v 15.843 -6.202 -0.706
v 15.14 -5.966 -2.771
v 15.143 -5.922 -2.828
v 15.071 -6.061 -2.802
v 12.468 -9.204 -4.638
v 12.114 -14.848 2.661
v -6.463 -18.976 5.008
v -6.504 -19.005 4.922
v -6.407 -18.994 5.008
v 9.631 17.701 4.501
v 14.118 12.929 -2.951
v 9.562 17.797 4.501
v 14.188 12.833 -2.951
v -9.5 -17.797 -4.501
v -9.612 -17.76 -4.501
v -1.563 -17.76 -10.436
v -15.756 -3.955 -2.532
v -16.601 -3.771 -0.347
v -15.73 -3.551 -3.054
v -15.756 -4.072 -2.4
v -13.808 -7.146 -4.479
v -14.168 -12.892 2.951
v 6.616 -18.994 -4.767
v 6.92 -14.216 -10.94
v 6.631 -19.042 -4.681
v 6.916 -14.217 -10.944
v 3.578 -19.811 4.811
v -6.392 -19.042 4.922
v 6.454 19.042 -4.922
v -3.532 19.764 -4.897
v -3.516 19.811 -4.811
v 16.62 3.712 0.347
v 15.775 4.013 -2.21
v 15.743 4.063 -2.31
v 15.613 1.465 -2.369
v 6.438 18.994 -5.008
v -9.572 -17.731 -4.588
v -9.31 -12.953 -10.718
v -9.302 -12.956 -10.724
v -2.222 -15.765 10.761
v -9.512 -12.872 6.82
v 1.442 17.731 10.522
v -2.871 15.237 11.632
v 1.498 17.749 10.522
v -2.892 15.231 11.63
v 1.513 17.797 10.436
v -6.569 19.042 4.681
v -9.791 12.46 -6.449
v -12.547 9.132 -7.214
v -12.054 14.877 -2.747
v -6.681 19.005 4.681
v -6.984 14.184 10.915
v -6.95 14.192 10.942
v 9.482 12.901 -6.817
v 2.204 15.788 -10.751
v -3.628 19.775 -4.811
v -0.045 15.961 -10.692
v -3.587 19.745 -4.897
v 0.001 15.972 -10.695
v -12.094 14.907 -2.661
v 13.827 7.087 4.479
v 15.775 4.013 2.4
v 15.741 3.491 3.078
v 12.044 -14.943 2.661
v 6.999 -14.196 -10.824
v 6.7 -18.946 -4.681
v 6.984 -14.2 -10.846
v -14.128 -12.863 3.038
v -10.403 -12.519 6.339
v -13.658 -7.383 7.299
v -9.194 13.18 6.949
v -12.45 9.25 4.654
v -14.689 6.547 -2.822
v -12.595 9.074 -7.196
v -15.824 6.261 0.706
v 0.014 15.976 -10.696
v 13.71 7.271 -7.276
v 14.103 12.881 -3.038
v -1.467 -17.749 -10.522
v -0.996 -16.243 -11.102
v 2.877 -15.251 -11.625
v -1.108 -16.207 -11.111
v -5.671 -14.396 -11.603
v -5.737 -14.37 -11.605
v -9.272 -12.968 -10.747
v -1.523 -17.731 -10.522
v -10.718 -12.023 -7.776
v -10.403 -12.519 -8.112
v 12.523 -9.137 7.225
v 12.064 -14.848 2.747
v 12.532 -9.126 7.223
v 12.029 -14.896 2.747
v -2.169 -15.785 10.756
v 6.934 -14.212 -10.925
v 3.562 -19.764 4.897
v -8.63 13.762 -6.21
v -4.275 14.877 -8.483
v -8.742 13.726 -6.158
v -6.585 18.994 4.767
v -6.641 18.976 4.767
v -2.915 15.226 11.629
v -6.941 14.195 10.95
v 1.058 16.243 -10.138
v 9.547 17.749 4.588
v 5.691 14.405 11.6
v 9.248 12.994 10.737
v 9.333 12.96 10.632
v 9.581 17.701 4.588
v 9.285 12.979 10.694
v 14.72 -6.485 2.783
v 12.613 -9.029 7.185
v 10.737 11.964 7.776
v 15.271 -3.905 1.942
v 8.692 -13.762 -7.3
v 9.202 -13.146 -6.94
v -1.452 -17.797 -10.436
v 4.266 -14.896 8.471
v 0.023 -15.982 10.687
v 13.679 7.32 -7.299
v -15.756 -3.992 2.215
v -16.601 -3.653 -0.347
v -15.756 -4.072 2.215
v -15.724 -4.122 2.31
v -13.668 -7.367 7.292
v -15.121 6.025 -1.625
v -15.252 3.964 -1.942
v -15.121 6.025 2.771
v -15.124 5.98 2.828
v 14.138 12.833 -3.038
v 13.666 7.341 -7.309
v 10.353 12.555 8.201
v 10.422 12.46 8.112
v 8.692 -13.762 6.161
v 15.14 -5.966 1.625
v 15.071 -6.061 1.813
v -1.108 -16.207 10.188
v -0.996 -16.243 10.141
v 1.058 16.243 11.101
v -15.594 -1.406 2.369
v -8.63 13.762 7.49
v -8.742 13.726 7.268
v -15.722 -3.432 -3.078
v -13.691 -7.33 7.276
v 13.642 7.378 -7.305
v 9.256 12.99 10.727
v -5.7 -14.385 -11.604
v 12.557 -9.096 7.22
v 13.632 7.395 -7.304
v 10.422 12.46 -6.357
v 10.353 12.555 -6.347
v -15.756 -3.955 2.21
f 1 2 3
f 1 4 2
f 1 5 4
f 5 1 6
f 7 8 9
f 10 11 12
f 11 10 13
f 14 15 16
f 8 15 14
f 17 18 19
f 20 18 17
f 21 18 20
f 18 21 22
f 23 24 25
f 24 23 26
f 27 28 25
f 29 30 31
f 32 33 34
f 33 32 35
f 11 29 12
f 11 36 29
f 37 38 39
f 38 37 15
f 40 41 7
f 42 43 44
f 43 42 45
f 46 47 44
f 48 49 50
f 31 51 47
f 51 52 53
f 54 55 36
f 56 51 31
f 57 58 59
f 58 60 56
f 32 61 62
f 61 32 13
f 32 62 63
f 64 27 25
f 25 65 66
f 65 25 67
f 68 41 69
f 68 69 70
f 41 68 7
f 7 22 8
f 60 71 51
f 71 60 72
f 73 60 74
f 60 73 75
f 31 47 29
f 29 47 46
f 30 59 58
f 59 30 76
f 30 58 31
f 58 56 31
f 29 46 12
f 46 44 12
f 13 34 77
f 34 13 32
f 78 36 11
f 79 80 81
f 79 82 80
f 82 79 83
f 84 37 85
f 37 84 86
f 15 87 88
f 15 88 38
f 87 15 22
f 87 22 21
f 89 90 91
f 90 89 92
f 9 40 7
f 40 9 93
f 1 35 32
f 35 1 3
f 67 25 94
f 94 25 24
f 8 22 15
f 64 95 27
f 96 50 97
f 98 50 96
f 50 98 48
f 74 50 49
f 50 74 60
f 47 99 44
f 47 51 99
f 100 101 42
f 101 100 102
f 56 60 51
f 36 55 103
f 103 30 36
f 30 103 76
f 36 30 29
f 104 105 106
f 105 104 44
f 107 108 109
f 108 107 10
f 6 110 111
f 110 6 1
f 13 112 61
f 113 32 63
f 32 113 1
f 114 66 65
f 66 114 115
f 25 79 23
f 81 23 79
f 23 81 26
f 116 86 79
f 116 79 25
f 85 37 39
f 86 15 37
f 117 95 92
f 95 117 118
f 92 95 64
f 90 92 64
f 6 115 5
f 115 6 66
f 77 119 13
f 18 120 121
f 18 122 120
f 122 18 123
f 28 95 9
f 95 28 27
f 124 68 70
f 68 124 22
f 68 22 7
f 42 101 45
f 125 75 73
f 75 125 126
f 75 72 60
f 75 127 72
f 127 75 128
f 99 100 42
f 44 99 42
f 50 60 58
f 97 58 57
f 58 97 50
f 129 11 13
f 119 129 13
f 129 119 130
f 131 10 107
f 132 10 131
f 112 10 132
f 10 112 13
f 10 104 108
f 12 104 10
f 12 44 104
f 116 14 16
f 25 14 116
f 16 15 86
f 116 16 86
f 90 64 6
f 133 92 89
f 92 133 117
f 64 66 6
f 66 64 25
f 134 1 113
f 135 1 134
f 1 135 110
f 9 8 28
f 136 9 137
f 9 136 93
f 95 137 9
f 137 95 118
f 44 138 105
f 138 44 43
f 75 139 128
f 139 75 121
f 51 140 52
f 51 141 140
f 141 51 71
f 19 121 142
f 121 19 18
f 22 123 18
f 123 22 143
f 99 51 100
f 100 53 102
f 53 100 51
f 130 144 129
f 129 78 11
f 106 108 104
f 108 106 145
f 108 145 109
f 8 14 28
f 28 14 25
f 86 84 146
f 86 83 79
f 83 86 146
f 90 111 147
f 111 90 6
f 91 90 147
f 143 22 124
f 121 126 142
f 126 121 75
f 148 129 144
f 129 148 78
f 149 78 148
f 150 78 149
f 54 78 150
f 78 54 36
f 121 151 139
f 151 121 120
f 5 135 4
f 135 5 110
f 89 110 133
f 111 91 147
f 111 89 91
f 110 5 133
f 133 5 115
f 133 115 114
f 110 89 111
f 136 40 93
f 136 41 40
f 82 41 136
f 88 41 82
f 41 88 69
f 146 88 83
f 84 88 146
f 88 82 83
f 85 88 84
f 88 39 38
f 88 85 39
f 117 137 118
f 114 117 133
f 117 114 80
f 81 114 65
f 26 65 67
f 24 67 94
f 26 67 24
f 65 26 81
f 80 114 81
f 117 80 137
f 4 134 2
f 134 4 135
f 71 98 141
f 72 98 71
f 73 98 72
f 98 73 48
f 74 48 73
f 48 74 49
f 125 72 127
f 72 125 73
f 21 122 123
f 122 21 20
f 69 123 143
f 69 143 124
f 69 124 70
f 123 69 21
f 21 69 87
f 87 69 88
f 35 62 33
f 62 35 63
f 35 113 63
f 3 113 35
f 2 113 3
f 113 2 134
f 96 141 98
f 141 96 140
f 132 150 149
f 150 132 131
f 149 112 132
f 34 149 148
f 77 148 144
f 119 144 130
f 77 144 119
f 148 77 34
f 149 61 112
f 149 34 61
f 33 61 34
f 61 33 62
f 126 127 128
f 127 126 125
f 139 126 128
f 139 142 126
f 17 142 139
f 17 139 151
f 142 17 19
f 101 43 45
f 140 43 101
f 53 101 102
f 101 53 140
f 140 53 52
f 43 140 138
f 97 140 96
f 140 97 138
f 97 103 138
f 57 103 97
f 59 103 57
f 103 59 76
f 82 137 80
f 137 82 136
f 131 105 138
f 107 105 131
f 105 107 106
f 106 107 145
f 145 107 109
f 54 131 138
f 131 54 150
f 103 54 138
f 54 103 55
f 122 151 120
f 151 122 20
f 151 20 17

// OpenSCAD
// Auto-generated OpenSCAD file

    inner_points = 10*[[-0.10267110435699114, -1.6147732450963963, 0.5000000000008641], [-0.1026711043570435, -1.6147732450969283, -0.4999999999991359], [0.1026711043570435, 1.6147732450969283, 0.4999999999991359], [0.10267110435699114, 1.6147732450963963, -0.5000000000008641], [0.8660772310082325, -1.3667275583225522, 0.5000000000006815], [0.8660772310081802, -1.3667275583230845, -0.4999999999993185], [-1.0322025675203217, -1.2460304363672796, 0.5000000000007166], [-1.032202567520374, -1.2460304363678119, -0.49999999999928335], [1.032202567520374, 1.2460304363678119, 0.49999999999928335], [1.0322025675203217, 1.2460304363672796, -0.5000000000007166], [-0.8660772310081802, 1.3667275583230845, 0.4999999999993185], [-0.8660772310082325, 1.3667275583225522, -0.5000000000006815], [1.504013501010716, -0.596638397630546, 0.5000000000002386], [1.5040135010106637, -0.5966383976310778, -0.4999999999997614], [-1.5674677331657878, -0.40134635196262397, 0.5000000000002954], [-1.5674677331658402, -0.4013463519631557, -0.4999999999997045], [1.5674677331658402, 0.4013463519631557, 0.4999999999997045], [1.5674677331657878, 0.40134635196262397, -0.5000000000002954], [-1.5040135010106637, 0.5966383976310778, 0.4999999999997614], [-1.504013501010716, 0.596638397630546, -0.5000000000002386], [0.2110002639625055, -0.8240665545671229, 1.8763819204716008], [-0.3136713683195228, -0.7907066905295395, -1.8763819204707366], [0.3136713683195228, 0.7907066905295395, 1.8763819204707366], [-0.2110002639625055, 0.8240665545671229, -1.8763819204716008], [-0.718531199200825, -0.4553237458380063, 1.8763819204714534], [0.6550769670457008, -0.5426610037556955, -1.8763819204709191], [-0.6550769670457008, 0.5426610037556955, 1.8763819204709191], [0.718531199200825, 0.4553237458380063, -1.8763819204714534], [0.8489365339649888, -0.05397739387511649, 1.8763819204711578], [-0.8489365339649888, 0.05397739387511649, -1.8763819204711578], [-0.5075309352384453, -1.2793903004064069, 1.3506508083527466], [0.3414055987263038, -1.3333676942839572, -1.3506508083513487], [-0.3414055987263038, 1.3333676942839572, 1.3506508083513487], [0.5075309352384453, 1.2793903004064069, -1.3506508083527466], [1.0599367979273688, -0.8780439484435167, 1.3506508083524513], [-1.162607902284386, -0.7367292966531456, -1.3506508083515871], [1.162607902284386, 0.7367292966531456, 1.3506508083515871], [-1.0599367979273688, 0.8780439484435167, -1.3506508083524513], [-1.3736081662466517, 0.0873372579164117, 1.3506508083520654], [1.3736081662466517, -0.0873372579164117, -1.3506508083520654]];

    outer_points = 10*[[1.3411441290868589, 0.49569687647638716, -0.9075522136038779], [1.263452202904808, -0.49569687647638716, -1.0129200987128433], [-1.263452202904808, 0.49569687647638716, 1.0129200987128433], [-1.3411441290868589, -0.49569687647638716, 0.9075522136038779], [0.5328721345308199, 0.6202033120279035, -1.4830472442710922], [0.45518020834876893, -0.3711904409248708, -1.5884151293800577], [1.6519824877191422, 0.3711904409248708, 0.034720391489278635], [1.574290561537091, -0.6202033120279035, -0.0706474936196867], [-1.574290561537091, 0.6202033120279035, 0.0706474936196867], [-1.6519824877191422, -0.3711904409248708, -0.034720391489278635], [-0.45518020834876893, 0.3711904409248708, 1.5884151293800577], [-0.5328721345308199, -0.6202033120279035, 1.4830472442710922], [-0.4641010661832383, 0.6971525210168389, -1.4719451591541524], [-0.5417929923652892, -0.29424123193593543, -1.5773130442631174], [1.3466575224373667, 0.29424123193593543, 0.983854462530699], [1.268965596255316, -0.6971525210168389, 0.8784865774217337], [-1.268965596255316, 0.6971525210168389, -0.8784865774217337], [-1.3466575224373667, -0.29424123193593543, -0.983854462530699], [0.5417929923652892, 0.29424123193593543, 1.5773130442631174], [0.4641010661832383, -0.6971525210168389, 1.4719451591541524], [0.642271561558062, 1.8946460465314703, -0.49215801202206017], [0.6600266044377715, -1.8946460465314703, -0.4680781441363005], [-0.6600266044377715, 1.8946460465314703, 0.4680781441363005], [-0.642271561558062, -1.8946460465314703, 0.49215801202206017], [0.9531099201903453, 1.770139610979954, 0.4501145930710967], [-0.14824539011826776, -1.770139610979954, -1.043573174803515], [0.14824539011826776, 1.770139610979954, 1.043573174803515], [-0.9531099201903453, -1.770139610979954, -0.4501145930710967], [-0.3547016391559959, 1.9715952555204057, -0.4810559269051196], [0.3547016391559959, -1.9715952555204057, 0.4810559269051196], [1.4087566933394584, 1.2833458031149498, -0.29514898898768743], [0.6984060027284527, -1.2833458031149498, -1.2585457489030916], [-0.6984060027284527, 1.2833458031149498, 1.2585457489030916], [-1.4087566933394584, -1.2833458031149498, 0.29514898898768743], [0.10094513399311722, 1.4848014476554017, -1.2263195089639038], [1.2013530320027161, -1.4848014476554017, 0.2660833528055431], [-1.2013530320027161, 1.4848014476554017, -0.2660833528055431], [-0.10094513399311722, -1.4848014476554017, 1.2263195089639038], [0.9147305218996641, 1.1588393675634334, 1.2405821978378877], [-0.9147305218996641, -1.1588393675634334, -1.2405821978378877]];

    // Convex hull for inner set (I)
    module inner_hull() {
        hull() {
            for (p = inner_points) {
                translate(p) sphere(r=0.1);
            }
        }
    }

    // Convex hull for outer set (O) minus inner hull (O \ I)
    module outer_minus_inner() {
        difference() {
            hull() {
                for (p = outer_points) {
                    translate(p) sphere(r=0.1);
                }
            }
            inner_hull(); // Subtract inner hull
        }
    }

    // Convex hull for outer set (O) minus all translated inner hulls
    module outer_minus_AllTranslationInner() {
        difference() {
            hull() {
                for (p = outer_points) {
                    translate(p) sphere(r=0.1);
                }
            }
            hull() {
                translate([0,0,50]) inner_hull();
                translate([0,0,-50]) inner_hull();
            }; // Subtract translated inner hulls
        }
    }

    // Difference between outer_minus_inner and outer_minus_AllTranslationInner
    module outer_minus_inner_diff() {
        difference() {
            // Outer minus inner
            difference() {
                hull() {
                    for (p = outer_points) {
                        translate(p) sphere(r=0.1);
                    }
                }
                inner_hull();
            }

            // Subtract Outer minus AllTranslationInner
            difference() {
                hull() {
                    for (p = outer_points) {
                        translate(p) sphere(r=0.1);
                    }
                }
                hull() {
                    translate([0,0,50]) inner_hull();
                    translate([0,0,-50]) inner_hull();
                };
            }
        }
    }

    // Rendering all with colors applied
    color([0, 1, 0, 1]) outer_minus_AllTranslationInner(); // Opaque green
    
